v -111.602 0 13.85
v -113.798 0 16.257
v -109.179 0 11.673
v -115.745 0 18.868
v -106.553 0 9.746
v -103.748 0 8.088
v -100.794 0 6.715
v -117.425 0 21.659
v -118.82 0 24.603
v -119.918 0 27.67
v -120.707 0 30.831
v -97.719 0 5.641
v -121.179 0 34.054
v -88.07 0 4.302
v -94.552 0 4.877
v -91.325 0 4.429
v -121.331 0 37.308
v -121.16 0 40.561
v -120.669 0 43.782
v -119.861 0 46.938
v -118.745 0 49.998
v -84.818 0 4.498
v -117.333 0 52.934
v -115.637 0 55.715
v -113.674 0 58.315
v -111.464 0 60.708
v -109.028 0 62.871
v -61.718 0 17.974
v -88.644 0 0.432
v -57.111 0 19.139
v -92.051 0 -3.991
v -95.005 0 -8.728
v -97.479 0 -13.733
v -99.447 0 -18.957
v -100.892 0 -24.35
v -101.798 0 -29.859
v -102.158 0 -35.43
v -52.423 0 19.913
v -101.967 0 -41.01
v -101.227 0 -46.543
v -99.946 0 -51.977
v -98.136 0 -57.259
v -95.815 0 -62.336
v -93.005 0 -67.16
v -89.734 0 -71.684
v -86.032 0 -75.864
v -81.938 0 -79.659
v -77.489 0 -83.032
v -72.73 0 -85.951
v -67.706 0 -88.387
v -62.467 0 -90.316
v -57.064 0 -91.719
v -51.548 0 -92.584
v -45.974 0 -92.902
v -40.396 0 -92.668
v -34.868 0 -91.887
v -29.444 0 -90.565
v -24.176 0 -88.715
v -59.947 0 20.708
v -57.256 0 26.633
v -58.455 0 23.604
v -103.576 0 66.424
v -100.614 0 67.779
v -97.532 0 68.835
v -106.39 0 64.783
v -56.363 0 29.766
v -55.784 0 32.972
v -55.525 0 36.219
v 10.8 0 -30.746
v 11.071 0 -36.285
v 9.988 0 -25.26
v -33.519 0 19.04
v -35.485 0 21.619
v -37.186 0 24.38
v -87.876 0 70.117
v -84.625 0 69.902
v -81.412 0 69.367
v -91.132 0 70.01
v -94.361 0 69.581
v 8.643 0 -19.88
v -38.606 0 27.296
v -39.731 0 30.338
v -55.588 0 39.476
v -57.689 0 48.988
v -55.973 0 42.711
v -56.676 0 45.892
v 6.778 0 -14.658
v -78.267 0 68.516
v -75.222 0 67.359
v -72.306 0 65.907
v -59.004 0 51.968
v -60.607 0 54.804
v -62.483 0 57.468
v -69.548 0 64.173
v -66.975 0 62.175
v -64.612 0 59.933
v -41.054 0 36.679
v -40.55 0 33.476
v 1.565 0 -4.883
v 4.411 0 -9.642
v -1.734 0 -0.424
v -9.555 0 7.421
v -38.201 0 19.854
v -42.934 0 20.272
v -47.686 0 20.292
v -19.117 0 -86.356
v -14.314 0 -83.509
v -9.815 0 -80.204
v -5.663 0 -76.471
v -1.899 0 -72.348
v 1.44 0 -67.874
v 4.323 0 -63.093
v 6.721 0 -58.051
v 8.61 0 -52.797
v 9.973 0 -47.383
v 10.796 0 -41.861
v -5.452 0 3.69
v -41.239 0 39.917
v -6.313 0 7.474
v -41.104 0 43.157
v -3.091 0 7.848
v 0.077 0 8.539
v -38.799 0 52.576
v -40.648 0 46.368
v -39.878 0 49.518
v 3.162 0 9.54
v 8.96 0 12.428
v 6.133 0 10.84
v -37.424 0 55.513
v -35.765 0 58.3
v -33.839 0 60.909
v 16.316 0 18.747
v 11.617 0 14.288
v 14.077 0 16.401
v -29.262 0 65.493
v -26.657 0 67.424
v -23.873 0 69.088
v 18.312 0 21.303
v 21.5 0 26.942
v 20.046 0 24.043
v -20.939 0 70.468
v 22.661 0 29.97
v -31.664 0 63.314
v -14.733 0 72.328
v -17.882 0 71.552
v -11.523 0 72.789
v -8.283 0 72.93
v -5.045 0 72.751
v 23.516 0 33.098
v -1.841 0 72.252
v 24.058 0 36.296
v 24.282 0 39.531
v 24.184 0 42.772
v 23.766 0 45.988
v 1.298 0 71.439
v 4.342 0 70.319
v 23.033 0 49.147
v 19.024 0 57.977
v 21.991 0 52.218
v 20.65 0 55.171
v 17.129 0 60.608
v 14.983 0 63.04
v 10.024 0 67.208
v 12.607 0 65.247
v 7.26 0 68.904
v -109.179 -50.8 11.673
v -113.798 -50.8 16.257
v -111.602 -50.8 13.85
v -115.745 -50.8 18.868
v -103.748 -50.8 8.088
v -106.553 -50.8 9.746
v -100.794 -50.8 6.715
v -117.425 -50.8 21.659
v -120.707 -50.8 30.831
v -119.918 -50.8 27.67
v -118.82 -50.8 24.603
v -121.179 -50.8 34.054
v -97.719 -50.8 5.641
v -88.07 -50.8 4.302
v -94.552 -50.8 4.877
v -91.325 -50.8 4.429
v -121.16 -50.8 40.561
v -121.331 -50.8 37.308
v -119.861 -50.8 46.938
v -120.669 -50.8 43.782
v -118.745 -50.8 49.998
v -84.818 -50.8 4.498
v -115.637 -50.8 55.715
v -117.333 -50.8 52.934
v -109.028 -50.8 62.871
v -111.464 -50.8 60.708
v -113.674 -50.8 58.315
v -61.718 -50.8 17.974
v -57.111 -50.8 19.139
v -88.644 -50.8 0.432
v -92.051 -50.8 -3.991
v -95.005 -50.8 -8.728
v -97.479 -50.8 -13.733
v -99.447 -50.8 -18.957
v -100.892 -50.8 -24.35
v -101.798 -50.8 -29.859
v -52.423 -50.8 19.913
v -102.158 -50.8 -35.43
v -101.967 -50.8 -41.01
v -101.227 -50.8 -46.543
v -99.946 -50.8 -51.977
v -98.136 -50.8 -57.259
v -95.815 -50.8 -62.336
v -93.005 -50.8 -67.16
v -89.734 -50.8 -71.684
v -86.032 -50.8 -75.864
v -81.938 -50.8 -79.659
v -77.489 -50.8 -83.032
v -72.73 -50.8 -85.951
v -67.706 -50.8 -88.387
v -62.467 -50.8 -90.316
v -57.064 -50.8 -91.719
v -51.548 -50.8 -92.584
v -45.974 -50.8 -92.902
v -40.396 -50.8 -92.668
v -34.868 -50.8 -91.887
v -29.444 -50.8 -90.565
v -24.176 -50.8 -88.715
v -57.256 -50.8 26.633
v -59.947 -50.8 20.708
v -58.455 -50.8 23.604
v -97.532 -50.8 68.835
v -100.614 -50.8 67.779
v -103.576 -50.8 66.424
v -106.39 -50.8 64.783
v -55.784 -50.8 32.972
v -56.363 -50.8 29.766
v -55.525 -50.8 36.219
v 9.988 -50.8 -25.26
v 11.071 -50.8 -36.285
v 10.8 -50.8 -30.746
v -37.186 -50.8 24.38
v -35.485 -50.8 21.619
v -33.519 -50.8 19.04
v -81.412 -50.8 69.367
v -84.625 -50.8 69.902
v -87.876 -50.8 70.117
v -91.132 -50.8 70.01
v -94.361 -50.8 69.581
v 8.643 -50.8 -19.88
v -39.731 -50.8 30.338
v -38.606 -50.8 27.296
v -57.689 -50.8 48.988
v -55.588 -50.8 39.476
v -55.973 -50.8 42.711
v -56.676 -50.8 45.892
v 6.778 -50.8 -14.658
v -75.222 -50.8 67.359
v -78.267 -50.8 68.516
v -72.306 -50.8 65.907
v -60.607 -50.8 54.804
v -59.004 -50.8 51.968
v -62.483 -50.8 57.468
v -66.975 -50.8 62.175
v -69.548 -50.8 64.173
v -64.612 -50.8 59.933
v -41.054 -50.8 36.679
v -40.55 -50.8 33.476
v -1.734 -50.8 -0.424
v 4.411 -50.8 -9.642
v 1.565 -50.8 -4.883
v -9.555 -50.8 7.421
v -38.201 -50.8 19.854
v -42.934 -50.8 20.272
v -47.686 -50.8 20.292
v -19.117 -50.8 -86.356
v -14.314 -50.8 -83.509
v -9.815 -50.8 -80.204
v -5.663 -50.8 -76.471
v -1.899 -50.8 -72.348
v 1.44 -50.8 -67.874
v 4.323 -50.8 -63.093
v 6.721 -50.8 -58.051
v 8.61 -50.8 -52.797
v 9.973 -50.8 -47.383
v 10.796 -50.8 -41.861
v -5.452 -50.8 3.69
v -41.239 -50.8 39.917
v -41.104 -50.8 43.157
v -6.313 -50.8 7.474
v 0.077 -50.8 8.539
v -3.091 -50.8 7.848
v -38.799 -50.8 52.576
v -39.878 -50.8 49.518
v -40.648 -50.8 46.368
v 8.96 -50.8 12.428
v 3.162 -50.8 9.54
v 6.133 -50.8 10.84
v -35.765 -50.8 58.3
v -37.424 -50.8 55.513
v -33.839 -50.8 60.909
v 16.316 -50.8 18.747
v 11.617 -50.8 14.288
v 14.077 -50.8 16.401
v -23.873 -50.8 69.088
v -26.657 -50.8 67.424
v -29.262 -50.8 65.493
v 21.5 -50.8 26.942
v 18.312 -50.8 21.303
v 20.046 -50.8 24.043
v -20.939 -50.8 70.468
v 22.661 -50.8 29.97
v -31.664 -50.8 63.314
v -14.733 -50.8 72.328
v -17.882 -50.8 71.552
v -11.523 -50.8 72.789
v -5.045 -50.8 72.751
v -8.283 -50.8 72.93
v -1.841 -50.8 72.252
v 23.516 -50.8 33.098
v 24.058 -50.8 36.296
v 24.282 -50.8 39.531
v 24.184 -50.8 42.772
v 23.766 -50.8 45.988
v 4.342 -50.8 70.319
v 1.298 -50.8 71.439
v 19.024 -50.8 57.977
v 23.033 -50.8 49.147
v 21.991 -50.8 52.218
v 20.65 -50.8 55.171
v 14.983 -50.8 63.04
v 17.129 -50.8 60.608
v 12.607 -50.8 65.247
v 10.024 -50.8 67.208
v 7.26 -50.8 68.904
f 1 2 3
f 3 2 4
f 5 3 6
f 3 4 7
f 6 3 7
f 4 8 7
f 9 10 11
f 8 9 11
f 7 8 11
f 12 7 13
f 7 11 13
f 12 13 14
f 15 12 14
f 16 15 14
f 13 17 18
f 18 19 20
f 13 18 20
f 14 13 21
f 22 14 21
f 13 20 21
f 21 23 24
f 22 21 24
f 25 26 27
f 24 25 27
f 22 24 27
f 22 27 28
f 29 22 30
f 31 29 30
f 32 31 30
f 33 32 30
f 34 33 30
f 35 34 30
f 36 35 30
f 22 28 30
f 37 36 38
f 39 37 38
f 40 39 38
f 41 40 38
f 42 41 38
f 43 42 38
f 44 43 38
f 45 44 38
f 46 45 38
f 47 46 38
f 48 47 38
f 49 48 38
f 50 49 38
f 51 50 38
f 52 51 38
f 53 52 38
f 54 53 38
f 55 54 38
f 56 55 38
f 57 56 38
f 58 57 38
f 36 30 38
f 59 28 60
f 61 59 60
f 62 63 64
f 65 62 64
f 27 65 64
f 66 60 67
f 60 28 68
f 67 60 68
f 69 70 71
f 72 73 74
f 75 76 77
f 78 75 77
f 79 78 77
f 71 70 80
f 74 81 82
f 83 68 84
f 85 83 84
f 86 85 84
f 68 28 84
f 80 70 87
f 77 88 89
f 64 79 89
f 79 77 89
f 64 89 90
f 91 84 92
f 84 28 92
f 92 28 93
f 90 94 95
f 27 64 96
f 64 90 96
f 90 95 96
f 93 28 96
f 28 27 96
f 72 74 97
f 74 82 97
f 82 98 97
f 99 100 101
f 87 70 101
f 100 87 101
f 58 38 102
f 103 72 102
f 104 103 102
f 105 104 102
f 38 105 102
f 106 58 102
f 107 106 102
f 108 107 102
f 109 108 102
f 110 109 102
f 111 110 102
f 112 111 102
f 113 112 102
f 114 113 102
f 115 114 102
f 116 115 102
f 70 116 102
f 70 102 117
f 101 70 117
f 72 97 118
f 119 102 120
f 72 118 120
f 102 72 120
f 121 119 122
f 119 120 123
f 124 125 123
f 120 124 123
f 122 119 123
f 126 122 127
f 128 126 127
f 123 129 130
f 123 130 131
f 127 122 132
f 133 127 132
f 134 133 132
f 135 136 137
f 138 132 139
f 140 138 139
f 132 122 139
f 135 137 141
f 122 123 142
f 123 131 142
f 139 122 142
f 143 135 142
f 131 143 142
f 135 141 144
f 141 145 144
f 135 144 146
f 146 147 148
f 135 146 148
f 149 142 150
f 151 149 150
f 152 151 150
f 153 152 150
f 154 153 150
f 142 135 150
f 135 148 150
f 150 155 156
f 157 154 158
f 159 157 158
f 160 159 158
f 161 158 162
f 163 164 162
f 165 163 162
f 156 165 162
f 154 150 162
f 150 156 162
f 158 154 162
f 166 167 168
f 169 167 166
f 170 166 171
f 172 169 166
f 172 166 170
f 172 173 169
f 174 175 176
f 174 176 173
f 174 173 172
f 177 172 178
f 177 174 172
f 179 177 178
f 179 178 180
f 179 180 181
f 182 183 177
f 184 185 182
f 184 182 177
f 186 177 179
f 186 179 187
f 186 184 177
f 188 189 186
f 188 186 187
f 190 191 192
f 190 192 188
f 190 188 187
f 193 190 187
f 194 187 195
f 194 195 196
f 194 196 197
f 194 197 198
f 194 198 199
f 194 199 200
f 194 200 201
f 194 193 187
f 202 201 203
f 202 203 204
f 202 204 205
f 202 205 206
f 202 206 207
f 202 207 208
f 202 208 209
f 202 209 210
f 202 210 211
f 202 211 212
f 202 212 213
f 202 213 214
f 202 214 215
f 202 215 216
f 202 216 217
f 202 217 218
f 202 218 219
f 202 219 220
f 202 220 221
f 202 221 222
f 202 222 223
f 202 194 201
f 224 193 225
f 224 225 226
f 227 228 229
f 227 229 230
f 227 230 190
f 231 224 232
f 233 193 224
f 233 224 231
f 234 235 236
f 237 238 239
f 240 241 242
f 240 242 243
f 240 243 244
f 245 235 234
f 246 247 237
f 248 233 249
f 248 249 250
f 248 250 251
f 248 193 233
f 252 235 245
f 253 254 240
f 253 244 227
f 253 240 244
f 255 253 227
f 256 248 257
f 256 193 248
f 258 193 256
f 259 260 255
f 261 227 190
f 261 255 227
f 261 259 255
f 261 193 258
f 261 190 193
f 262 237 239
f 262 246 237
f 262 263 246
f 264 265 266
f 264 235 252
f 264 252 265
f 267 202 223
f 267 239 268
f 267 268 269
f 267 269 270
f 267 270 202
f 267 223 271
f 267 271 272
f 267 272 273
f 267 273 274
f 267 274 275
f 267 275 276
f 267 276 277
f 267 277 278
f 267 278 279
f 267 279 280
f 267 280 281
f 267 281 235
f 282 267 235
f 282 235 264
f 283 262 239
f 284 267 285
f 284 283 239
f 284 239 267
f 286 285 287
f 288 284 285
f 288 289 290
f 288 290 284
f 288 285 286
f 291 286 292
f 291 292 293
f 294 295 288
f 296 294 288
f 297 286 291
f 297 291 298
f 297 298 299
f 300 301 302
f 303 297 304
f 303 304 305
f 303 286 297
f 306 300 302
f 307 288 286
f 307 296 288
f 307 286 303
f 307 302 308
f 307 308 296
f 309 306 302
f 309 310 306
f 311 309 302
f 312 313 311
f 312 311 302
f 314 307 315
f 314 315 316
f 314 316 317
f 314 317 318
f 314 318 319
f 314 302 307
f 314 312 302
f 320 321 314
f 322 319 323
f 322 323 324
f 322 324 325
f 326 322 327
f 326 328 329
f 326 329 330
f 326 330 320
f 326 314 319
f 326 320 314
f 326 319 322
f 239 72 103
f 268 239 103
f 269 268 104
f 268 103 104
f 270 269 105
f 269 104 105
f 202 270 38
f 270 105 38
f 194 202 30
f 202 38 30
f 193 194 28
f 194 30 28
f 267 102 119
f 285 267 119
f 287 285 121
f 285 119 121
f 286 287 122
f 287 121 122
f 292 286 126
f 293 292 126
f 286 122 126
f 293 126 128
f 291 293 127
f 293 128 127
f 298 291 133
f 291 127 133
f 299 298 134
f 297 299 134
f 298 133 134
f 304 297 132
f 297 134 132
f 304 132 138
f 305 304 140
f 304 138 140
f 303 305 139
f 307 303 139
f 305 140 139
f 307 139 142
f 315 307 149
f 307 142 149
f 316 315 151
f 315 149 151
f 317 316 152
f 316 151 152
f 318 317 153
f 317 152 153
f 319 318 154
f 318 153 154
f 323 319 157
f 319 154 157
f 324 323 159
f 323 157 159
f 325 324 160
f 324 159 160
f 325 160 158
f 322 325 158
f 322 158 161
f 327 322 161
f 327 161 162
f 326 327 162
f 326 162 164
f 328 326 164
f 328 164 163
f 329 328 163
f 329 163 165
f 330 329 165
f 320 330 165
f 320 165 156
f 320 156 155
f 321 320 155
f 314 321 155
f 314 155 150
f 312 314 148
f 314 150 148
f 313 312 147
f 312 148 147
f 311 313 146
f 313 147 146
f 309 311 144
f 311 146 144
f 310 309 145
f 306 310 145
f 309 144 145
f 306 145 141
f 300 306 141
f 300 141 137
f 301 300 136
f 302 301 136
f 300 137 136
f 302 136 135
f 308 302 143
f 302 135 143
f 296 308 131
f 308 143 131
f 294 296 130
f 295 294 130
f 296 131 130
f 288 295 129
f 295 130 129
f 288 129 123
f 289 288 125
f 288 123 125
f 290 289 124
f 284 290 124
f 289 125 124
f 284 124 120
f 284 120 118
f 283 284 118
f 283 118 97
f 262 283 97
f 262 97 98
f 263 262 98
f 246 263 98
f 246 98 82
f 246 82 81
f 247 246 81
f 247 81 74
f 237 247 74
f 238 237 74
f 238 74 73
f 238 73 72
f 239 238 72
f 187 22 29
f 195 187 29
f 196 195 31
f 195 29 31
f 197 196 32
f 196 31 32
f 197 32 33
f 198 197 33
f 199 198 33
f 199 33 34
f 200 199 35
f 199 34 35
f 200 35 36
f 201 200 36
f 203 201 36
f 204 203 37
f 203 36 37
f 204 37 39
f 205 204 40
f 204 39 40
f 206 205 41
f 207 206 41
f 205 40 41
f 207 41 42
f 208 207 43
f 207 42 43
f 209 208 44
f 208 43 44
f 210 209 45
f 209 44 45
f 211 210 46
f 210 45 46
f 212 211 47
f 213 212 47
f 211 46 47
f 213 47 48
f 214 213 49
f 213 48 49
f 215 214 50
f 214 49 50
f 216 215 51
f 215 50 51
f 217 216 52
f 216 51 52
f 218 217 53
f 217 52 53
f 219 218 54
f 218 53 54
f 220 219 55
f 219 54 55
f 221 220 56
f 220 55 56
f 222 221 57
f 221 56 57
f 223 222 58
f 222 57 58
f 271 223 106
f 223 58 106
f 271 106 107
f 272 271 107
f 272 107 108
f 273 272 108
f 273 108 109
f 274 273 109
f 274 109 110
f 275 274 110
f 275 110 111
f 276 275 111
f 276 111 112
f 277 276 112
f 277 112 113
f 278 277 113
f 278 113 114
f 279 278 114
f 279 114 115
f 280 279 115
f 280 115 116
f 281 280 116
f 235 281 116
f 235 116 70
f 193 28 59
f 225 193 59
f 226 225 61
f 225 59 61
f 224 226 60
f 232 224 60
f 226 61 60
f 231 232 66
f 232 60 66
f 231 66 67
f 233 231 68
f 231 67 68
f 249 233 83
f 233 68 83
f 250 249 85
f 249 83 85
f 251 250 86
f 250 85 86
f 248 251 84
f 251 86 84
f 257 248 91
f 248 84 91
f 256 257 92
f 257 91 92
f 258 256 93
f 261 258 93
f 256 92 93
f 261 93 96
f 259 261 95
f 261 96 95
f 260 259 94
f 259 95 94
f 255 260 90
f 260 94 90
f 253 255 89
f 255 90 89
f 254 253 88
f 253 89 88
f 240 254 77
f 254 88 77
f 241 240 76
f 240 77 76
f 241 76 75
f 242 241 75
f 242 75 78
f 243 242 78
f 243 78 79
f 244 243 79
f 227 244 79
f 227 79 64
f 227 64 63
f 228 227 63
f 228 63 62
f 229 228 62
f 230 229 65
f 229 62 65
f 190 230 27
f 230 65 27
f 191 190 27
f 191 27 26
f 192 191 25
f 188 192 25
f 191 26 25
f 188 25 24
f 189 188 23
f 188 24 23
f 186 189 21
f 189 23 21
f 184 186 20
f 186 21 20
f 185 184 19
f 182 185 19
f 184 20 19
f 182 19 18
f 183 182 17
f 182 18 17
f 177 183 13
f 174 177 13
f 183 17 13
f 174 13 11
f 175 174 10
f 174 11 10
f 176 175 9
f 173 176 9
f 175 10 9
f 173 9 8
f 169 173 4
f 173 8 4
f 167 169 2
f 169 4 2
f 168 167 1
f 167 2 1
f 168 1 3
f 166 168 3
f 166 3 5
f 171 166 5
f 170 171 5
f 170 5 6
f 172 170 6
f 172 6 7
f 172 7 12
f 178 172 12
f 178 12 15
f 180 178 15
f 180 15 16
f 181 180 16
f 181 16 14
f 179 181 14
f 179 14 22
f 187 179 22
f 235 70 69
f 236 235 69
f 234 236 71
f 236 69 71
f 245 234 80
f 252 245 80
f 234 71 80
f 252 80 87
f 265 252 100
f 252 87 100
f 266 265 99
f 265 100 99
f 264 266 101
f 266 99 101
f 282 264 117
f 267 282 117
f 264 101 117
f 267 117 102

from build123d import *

# Parameters (mm, degrees)
F2_DEPTH = 50.8
F1_R     = 10.802579
F1_R_2   = 10.017442
F3_DEPTH = 25.4


with BuildPart() as f2:
    # F0 (on Front) → F2 (new body)
    with BuildSketch(Plane.XZ):
        with BuildLine():
            ThreePointArc((-84.818284, 4.49832), (-74.075205, 12.619594), (-61.718, 17.973872))
            ThreePointArc((-61.718, 17.973872), (-105.003657, 65.638275), (-84.818284, 4.49832))
        make_face()
        with BuildLine():
            ThreePointArc((-33.519126, 19.040262), (-47.686065, 20.292057), (-61.718, 17.973872))
            ThreePointArc((-61.718, 17.973872), (-74.075205, 12.619594), (-84.818284, 4.49832))
            ThreePointArc((-84.818284, 4.49832), (-67.706115, -88.386562), (11.071378, -36.285371))
            ThreePointArc((11.071378, -36.285371), (5.655705, -12.12097), (-9.555264, 7.420632))
            ThreePointArc((-9.555264, 7.420632), (-20.844259, 14.65953), (-33.519126, 19.040262))
        make_face()
        with BuildLine():
            ThreePointArc((-9.555264, 7.420632), (5.818639, 69.648031), (-33.519126, 19.040262))
            ThreePointArc((-33.519126, 19.040262), (-20.844259, 14.65953), (-9.555264, 7.420632))
        make_face()
    extrude(amount=F2_DEPTH)

    # F1 (on Front) → F3 (cut)
    with BuildSketch(Plane.XZ):
        with Locations((-75.122081, -19.301618)):
            Circle(F1_R)
        with Locations((-25.931325, -18.290848)):
            Circle(F1_R_2)
    extrude(amount=-F3_DEPTH, mode=Mode.SUBTRACT)


solid = f2.part
